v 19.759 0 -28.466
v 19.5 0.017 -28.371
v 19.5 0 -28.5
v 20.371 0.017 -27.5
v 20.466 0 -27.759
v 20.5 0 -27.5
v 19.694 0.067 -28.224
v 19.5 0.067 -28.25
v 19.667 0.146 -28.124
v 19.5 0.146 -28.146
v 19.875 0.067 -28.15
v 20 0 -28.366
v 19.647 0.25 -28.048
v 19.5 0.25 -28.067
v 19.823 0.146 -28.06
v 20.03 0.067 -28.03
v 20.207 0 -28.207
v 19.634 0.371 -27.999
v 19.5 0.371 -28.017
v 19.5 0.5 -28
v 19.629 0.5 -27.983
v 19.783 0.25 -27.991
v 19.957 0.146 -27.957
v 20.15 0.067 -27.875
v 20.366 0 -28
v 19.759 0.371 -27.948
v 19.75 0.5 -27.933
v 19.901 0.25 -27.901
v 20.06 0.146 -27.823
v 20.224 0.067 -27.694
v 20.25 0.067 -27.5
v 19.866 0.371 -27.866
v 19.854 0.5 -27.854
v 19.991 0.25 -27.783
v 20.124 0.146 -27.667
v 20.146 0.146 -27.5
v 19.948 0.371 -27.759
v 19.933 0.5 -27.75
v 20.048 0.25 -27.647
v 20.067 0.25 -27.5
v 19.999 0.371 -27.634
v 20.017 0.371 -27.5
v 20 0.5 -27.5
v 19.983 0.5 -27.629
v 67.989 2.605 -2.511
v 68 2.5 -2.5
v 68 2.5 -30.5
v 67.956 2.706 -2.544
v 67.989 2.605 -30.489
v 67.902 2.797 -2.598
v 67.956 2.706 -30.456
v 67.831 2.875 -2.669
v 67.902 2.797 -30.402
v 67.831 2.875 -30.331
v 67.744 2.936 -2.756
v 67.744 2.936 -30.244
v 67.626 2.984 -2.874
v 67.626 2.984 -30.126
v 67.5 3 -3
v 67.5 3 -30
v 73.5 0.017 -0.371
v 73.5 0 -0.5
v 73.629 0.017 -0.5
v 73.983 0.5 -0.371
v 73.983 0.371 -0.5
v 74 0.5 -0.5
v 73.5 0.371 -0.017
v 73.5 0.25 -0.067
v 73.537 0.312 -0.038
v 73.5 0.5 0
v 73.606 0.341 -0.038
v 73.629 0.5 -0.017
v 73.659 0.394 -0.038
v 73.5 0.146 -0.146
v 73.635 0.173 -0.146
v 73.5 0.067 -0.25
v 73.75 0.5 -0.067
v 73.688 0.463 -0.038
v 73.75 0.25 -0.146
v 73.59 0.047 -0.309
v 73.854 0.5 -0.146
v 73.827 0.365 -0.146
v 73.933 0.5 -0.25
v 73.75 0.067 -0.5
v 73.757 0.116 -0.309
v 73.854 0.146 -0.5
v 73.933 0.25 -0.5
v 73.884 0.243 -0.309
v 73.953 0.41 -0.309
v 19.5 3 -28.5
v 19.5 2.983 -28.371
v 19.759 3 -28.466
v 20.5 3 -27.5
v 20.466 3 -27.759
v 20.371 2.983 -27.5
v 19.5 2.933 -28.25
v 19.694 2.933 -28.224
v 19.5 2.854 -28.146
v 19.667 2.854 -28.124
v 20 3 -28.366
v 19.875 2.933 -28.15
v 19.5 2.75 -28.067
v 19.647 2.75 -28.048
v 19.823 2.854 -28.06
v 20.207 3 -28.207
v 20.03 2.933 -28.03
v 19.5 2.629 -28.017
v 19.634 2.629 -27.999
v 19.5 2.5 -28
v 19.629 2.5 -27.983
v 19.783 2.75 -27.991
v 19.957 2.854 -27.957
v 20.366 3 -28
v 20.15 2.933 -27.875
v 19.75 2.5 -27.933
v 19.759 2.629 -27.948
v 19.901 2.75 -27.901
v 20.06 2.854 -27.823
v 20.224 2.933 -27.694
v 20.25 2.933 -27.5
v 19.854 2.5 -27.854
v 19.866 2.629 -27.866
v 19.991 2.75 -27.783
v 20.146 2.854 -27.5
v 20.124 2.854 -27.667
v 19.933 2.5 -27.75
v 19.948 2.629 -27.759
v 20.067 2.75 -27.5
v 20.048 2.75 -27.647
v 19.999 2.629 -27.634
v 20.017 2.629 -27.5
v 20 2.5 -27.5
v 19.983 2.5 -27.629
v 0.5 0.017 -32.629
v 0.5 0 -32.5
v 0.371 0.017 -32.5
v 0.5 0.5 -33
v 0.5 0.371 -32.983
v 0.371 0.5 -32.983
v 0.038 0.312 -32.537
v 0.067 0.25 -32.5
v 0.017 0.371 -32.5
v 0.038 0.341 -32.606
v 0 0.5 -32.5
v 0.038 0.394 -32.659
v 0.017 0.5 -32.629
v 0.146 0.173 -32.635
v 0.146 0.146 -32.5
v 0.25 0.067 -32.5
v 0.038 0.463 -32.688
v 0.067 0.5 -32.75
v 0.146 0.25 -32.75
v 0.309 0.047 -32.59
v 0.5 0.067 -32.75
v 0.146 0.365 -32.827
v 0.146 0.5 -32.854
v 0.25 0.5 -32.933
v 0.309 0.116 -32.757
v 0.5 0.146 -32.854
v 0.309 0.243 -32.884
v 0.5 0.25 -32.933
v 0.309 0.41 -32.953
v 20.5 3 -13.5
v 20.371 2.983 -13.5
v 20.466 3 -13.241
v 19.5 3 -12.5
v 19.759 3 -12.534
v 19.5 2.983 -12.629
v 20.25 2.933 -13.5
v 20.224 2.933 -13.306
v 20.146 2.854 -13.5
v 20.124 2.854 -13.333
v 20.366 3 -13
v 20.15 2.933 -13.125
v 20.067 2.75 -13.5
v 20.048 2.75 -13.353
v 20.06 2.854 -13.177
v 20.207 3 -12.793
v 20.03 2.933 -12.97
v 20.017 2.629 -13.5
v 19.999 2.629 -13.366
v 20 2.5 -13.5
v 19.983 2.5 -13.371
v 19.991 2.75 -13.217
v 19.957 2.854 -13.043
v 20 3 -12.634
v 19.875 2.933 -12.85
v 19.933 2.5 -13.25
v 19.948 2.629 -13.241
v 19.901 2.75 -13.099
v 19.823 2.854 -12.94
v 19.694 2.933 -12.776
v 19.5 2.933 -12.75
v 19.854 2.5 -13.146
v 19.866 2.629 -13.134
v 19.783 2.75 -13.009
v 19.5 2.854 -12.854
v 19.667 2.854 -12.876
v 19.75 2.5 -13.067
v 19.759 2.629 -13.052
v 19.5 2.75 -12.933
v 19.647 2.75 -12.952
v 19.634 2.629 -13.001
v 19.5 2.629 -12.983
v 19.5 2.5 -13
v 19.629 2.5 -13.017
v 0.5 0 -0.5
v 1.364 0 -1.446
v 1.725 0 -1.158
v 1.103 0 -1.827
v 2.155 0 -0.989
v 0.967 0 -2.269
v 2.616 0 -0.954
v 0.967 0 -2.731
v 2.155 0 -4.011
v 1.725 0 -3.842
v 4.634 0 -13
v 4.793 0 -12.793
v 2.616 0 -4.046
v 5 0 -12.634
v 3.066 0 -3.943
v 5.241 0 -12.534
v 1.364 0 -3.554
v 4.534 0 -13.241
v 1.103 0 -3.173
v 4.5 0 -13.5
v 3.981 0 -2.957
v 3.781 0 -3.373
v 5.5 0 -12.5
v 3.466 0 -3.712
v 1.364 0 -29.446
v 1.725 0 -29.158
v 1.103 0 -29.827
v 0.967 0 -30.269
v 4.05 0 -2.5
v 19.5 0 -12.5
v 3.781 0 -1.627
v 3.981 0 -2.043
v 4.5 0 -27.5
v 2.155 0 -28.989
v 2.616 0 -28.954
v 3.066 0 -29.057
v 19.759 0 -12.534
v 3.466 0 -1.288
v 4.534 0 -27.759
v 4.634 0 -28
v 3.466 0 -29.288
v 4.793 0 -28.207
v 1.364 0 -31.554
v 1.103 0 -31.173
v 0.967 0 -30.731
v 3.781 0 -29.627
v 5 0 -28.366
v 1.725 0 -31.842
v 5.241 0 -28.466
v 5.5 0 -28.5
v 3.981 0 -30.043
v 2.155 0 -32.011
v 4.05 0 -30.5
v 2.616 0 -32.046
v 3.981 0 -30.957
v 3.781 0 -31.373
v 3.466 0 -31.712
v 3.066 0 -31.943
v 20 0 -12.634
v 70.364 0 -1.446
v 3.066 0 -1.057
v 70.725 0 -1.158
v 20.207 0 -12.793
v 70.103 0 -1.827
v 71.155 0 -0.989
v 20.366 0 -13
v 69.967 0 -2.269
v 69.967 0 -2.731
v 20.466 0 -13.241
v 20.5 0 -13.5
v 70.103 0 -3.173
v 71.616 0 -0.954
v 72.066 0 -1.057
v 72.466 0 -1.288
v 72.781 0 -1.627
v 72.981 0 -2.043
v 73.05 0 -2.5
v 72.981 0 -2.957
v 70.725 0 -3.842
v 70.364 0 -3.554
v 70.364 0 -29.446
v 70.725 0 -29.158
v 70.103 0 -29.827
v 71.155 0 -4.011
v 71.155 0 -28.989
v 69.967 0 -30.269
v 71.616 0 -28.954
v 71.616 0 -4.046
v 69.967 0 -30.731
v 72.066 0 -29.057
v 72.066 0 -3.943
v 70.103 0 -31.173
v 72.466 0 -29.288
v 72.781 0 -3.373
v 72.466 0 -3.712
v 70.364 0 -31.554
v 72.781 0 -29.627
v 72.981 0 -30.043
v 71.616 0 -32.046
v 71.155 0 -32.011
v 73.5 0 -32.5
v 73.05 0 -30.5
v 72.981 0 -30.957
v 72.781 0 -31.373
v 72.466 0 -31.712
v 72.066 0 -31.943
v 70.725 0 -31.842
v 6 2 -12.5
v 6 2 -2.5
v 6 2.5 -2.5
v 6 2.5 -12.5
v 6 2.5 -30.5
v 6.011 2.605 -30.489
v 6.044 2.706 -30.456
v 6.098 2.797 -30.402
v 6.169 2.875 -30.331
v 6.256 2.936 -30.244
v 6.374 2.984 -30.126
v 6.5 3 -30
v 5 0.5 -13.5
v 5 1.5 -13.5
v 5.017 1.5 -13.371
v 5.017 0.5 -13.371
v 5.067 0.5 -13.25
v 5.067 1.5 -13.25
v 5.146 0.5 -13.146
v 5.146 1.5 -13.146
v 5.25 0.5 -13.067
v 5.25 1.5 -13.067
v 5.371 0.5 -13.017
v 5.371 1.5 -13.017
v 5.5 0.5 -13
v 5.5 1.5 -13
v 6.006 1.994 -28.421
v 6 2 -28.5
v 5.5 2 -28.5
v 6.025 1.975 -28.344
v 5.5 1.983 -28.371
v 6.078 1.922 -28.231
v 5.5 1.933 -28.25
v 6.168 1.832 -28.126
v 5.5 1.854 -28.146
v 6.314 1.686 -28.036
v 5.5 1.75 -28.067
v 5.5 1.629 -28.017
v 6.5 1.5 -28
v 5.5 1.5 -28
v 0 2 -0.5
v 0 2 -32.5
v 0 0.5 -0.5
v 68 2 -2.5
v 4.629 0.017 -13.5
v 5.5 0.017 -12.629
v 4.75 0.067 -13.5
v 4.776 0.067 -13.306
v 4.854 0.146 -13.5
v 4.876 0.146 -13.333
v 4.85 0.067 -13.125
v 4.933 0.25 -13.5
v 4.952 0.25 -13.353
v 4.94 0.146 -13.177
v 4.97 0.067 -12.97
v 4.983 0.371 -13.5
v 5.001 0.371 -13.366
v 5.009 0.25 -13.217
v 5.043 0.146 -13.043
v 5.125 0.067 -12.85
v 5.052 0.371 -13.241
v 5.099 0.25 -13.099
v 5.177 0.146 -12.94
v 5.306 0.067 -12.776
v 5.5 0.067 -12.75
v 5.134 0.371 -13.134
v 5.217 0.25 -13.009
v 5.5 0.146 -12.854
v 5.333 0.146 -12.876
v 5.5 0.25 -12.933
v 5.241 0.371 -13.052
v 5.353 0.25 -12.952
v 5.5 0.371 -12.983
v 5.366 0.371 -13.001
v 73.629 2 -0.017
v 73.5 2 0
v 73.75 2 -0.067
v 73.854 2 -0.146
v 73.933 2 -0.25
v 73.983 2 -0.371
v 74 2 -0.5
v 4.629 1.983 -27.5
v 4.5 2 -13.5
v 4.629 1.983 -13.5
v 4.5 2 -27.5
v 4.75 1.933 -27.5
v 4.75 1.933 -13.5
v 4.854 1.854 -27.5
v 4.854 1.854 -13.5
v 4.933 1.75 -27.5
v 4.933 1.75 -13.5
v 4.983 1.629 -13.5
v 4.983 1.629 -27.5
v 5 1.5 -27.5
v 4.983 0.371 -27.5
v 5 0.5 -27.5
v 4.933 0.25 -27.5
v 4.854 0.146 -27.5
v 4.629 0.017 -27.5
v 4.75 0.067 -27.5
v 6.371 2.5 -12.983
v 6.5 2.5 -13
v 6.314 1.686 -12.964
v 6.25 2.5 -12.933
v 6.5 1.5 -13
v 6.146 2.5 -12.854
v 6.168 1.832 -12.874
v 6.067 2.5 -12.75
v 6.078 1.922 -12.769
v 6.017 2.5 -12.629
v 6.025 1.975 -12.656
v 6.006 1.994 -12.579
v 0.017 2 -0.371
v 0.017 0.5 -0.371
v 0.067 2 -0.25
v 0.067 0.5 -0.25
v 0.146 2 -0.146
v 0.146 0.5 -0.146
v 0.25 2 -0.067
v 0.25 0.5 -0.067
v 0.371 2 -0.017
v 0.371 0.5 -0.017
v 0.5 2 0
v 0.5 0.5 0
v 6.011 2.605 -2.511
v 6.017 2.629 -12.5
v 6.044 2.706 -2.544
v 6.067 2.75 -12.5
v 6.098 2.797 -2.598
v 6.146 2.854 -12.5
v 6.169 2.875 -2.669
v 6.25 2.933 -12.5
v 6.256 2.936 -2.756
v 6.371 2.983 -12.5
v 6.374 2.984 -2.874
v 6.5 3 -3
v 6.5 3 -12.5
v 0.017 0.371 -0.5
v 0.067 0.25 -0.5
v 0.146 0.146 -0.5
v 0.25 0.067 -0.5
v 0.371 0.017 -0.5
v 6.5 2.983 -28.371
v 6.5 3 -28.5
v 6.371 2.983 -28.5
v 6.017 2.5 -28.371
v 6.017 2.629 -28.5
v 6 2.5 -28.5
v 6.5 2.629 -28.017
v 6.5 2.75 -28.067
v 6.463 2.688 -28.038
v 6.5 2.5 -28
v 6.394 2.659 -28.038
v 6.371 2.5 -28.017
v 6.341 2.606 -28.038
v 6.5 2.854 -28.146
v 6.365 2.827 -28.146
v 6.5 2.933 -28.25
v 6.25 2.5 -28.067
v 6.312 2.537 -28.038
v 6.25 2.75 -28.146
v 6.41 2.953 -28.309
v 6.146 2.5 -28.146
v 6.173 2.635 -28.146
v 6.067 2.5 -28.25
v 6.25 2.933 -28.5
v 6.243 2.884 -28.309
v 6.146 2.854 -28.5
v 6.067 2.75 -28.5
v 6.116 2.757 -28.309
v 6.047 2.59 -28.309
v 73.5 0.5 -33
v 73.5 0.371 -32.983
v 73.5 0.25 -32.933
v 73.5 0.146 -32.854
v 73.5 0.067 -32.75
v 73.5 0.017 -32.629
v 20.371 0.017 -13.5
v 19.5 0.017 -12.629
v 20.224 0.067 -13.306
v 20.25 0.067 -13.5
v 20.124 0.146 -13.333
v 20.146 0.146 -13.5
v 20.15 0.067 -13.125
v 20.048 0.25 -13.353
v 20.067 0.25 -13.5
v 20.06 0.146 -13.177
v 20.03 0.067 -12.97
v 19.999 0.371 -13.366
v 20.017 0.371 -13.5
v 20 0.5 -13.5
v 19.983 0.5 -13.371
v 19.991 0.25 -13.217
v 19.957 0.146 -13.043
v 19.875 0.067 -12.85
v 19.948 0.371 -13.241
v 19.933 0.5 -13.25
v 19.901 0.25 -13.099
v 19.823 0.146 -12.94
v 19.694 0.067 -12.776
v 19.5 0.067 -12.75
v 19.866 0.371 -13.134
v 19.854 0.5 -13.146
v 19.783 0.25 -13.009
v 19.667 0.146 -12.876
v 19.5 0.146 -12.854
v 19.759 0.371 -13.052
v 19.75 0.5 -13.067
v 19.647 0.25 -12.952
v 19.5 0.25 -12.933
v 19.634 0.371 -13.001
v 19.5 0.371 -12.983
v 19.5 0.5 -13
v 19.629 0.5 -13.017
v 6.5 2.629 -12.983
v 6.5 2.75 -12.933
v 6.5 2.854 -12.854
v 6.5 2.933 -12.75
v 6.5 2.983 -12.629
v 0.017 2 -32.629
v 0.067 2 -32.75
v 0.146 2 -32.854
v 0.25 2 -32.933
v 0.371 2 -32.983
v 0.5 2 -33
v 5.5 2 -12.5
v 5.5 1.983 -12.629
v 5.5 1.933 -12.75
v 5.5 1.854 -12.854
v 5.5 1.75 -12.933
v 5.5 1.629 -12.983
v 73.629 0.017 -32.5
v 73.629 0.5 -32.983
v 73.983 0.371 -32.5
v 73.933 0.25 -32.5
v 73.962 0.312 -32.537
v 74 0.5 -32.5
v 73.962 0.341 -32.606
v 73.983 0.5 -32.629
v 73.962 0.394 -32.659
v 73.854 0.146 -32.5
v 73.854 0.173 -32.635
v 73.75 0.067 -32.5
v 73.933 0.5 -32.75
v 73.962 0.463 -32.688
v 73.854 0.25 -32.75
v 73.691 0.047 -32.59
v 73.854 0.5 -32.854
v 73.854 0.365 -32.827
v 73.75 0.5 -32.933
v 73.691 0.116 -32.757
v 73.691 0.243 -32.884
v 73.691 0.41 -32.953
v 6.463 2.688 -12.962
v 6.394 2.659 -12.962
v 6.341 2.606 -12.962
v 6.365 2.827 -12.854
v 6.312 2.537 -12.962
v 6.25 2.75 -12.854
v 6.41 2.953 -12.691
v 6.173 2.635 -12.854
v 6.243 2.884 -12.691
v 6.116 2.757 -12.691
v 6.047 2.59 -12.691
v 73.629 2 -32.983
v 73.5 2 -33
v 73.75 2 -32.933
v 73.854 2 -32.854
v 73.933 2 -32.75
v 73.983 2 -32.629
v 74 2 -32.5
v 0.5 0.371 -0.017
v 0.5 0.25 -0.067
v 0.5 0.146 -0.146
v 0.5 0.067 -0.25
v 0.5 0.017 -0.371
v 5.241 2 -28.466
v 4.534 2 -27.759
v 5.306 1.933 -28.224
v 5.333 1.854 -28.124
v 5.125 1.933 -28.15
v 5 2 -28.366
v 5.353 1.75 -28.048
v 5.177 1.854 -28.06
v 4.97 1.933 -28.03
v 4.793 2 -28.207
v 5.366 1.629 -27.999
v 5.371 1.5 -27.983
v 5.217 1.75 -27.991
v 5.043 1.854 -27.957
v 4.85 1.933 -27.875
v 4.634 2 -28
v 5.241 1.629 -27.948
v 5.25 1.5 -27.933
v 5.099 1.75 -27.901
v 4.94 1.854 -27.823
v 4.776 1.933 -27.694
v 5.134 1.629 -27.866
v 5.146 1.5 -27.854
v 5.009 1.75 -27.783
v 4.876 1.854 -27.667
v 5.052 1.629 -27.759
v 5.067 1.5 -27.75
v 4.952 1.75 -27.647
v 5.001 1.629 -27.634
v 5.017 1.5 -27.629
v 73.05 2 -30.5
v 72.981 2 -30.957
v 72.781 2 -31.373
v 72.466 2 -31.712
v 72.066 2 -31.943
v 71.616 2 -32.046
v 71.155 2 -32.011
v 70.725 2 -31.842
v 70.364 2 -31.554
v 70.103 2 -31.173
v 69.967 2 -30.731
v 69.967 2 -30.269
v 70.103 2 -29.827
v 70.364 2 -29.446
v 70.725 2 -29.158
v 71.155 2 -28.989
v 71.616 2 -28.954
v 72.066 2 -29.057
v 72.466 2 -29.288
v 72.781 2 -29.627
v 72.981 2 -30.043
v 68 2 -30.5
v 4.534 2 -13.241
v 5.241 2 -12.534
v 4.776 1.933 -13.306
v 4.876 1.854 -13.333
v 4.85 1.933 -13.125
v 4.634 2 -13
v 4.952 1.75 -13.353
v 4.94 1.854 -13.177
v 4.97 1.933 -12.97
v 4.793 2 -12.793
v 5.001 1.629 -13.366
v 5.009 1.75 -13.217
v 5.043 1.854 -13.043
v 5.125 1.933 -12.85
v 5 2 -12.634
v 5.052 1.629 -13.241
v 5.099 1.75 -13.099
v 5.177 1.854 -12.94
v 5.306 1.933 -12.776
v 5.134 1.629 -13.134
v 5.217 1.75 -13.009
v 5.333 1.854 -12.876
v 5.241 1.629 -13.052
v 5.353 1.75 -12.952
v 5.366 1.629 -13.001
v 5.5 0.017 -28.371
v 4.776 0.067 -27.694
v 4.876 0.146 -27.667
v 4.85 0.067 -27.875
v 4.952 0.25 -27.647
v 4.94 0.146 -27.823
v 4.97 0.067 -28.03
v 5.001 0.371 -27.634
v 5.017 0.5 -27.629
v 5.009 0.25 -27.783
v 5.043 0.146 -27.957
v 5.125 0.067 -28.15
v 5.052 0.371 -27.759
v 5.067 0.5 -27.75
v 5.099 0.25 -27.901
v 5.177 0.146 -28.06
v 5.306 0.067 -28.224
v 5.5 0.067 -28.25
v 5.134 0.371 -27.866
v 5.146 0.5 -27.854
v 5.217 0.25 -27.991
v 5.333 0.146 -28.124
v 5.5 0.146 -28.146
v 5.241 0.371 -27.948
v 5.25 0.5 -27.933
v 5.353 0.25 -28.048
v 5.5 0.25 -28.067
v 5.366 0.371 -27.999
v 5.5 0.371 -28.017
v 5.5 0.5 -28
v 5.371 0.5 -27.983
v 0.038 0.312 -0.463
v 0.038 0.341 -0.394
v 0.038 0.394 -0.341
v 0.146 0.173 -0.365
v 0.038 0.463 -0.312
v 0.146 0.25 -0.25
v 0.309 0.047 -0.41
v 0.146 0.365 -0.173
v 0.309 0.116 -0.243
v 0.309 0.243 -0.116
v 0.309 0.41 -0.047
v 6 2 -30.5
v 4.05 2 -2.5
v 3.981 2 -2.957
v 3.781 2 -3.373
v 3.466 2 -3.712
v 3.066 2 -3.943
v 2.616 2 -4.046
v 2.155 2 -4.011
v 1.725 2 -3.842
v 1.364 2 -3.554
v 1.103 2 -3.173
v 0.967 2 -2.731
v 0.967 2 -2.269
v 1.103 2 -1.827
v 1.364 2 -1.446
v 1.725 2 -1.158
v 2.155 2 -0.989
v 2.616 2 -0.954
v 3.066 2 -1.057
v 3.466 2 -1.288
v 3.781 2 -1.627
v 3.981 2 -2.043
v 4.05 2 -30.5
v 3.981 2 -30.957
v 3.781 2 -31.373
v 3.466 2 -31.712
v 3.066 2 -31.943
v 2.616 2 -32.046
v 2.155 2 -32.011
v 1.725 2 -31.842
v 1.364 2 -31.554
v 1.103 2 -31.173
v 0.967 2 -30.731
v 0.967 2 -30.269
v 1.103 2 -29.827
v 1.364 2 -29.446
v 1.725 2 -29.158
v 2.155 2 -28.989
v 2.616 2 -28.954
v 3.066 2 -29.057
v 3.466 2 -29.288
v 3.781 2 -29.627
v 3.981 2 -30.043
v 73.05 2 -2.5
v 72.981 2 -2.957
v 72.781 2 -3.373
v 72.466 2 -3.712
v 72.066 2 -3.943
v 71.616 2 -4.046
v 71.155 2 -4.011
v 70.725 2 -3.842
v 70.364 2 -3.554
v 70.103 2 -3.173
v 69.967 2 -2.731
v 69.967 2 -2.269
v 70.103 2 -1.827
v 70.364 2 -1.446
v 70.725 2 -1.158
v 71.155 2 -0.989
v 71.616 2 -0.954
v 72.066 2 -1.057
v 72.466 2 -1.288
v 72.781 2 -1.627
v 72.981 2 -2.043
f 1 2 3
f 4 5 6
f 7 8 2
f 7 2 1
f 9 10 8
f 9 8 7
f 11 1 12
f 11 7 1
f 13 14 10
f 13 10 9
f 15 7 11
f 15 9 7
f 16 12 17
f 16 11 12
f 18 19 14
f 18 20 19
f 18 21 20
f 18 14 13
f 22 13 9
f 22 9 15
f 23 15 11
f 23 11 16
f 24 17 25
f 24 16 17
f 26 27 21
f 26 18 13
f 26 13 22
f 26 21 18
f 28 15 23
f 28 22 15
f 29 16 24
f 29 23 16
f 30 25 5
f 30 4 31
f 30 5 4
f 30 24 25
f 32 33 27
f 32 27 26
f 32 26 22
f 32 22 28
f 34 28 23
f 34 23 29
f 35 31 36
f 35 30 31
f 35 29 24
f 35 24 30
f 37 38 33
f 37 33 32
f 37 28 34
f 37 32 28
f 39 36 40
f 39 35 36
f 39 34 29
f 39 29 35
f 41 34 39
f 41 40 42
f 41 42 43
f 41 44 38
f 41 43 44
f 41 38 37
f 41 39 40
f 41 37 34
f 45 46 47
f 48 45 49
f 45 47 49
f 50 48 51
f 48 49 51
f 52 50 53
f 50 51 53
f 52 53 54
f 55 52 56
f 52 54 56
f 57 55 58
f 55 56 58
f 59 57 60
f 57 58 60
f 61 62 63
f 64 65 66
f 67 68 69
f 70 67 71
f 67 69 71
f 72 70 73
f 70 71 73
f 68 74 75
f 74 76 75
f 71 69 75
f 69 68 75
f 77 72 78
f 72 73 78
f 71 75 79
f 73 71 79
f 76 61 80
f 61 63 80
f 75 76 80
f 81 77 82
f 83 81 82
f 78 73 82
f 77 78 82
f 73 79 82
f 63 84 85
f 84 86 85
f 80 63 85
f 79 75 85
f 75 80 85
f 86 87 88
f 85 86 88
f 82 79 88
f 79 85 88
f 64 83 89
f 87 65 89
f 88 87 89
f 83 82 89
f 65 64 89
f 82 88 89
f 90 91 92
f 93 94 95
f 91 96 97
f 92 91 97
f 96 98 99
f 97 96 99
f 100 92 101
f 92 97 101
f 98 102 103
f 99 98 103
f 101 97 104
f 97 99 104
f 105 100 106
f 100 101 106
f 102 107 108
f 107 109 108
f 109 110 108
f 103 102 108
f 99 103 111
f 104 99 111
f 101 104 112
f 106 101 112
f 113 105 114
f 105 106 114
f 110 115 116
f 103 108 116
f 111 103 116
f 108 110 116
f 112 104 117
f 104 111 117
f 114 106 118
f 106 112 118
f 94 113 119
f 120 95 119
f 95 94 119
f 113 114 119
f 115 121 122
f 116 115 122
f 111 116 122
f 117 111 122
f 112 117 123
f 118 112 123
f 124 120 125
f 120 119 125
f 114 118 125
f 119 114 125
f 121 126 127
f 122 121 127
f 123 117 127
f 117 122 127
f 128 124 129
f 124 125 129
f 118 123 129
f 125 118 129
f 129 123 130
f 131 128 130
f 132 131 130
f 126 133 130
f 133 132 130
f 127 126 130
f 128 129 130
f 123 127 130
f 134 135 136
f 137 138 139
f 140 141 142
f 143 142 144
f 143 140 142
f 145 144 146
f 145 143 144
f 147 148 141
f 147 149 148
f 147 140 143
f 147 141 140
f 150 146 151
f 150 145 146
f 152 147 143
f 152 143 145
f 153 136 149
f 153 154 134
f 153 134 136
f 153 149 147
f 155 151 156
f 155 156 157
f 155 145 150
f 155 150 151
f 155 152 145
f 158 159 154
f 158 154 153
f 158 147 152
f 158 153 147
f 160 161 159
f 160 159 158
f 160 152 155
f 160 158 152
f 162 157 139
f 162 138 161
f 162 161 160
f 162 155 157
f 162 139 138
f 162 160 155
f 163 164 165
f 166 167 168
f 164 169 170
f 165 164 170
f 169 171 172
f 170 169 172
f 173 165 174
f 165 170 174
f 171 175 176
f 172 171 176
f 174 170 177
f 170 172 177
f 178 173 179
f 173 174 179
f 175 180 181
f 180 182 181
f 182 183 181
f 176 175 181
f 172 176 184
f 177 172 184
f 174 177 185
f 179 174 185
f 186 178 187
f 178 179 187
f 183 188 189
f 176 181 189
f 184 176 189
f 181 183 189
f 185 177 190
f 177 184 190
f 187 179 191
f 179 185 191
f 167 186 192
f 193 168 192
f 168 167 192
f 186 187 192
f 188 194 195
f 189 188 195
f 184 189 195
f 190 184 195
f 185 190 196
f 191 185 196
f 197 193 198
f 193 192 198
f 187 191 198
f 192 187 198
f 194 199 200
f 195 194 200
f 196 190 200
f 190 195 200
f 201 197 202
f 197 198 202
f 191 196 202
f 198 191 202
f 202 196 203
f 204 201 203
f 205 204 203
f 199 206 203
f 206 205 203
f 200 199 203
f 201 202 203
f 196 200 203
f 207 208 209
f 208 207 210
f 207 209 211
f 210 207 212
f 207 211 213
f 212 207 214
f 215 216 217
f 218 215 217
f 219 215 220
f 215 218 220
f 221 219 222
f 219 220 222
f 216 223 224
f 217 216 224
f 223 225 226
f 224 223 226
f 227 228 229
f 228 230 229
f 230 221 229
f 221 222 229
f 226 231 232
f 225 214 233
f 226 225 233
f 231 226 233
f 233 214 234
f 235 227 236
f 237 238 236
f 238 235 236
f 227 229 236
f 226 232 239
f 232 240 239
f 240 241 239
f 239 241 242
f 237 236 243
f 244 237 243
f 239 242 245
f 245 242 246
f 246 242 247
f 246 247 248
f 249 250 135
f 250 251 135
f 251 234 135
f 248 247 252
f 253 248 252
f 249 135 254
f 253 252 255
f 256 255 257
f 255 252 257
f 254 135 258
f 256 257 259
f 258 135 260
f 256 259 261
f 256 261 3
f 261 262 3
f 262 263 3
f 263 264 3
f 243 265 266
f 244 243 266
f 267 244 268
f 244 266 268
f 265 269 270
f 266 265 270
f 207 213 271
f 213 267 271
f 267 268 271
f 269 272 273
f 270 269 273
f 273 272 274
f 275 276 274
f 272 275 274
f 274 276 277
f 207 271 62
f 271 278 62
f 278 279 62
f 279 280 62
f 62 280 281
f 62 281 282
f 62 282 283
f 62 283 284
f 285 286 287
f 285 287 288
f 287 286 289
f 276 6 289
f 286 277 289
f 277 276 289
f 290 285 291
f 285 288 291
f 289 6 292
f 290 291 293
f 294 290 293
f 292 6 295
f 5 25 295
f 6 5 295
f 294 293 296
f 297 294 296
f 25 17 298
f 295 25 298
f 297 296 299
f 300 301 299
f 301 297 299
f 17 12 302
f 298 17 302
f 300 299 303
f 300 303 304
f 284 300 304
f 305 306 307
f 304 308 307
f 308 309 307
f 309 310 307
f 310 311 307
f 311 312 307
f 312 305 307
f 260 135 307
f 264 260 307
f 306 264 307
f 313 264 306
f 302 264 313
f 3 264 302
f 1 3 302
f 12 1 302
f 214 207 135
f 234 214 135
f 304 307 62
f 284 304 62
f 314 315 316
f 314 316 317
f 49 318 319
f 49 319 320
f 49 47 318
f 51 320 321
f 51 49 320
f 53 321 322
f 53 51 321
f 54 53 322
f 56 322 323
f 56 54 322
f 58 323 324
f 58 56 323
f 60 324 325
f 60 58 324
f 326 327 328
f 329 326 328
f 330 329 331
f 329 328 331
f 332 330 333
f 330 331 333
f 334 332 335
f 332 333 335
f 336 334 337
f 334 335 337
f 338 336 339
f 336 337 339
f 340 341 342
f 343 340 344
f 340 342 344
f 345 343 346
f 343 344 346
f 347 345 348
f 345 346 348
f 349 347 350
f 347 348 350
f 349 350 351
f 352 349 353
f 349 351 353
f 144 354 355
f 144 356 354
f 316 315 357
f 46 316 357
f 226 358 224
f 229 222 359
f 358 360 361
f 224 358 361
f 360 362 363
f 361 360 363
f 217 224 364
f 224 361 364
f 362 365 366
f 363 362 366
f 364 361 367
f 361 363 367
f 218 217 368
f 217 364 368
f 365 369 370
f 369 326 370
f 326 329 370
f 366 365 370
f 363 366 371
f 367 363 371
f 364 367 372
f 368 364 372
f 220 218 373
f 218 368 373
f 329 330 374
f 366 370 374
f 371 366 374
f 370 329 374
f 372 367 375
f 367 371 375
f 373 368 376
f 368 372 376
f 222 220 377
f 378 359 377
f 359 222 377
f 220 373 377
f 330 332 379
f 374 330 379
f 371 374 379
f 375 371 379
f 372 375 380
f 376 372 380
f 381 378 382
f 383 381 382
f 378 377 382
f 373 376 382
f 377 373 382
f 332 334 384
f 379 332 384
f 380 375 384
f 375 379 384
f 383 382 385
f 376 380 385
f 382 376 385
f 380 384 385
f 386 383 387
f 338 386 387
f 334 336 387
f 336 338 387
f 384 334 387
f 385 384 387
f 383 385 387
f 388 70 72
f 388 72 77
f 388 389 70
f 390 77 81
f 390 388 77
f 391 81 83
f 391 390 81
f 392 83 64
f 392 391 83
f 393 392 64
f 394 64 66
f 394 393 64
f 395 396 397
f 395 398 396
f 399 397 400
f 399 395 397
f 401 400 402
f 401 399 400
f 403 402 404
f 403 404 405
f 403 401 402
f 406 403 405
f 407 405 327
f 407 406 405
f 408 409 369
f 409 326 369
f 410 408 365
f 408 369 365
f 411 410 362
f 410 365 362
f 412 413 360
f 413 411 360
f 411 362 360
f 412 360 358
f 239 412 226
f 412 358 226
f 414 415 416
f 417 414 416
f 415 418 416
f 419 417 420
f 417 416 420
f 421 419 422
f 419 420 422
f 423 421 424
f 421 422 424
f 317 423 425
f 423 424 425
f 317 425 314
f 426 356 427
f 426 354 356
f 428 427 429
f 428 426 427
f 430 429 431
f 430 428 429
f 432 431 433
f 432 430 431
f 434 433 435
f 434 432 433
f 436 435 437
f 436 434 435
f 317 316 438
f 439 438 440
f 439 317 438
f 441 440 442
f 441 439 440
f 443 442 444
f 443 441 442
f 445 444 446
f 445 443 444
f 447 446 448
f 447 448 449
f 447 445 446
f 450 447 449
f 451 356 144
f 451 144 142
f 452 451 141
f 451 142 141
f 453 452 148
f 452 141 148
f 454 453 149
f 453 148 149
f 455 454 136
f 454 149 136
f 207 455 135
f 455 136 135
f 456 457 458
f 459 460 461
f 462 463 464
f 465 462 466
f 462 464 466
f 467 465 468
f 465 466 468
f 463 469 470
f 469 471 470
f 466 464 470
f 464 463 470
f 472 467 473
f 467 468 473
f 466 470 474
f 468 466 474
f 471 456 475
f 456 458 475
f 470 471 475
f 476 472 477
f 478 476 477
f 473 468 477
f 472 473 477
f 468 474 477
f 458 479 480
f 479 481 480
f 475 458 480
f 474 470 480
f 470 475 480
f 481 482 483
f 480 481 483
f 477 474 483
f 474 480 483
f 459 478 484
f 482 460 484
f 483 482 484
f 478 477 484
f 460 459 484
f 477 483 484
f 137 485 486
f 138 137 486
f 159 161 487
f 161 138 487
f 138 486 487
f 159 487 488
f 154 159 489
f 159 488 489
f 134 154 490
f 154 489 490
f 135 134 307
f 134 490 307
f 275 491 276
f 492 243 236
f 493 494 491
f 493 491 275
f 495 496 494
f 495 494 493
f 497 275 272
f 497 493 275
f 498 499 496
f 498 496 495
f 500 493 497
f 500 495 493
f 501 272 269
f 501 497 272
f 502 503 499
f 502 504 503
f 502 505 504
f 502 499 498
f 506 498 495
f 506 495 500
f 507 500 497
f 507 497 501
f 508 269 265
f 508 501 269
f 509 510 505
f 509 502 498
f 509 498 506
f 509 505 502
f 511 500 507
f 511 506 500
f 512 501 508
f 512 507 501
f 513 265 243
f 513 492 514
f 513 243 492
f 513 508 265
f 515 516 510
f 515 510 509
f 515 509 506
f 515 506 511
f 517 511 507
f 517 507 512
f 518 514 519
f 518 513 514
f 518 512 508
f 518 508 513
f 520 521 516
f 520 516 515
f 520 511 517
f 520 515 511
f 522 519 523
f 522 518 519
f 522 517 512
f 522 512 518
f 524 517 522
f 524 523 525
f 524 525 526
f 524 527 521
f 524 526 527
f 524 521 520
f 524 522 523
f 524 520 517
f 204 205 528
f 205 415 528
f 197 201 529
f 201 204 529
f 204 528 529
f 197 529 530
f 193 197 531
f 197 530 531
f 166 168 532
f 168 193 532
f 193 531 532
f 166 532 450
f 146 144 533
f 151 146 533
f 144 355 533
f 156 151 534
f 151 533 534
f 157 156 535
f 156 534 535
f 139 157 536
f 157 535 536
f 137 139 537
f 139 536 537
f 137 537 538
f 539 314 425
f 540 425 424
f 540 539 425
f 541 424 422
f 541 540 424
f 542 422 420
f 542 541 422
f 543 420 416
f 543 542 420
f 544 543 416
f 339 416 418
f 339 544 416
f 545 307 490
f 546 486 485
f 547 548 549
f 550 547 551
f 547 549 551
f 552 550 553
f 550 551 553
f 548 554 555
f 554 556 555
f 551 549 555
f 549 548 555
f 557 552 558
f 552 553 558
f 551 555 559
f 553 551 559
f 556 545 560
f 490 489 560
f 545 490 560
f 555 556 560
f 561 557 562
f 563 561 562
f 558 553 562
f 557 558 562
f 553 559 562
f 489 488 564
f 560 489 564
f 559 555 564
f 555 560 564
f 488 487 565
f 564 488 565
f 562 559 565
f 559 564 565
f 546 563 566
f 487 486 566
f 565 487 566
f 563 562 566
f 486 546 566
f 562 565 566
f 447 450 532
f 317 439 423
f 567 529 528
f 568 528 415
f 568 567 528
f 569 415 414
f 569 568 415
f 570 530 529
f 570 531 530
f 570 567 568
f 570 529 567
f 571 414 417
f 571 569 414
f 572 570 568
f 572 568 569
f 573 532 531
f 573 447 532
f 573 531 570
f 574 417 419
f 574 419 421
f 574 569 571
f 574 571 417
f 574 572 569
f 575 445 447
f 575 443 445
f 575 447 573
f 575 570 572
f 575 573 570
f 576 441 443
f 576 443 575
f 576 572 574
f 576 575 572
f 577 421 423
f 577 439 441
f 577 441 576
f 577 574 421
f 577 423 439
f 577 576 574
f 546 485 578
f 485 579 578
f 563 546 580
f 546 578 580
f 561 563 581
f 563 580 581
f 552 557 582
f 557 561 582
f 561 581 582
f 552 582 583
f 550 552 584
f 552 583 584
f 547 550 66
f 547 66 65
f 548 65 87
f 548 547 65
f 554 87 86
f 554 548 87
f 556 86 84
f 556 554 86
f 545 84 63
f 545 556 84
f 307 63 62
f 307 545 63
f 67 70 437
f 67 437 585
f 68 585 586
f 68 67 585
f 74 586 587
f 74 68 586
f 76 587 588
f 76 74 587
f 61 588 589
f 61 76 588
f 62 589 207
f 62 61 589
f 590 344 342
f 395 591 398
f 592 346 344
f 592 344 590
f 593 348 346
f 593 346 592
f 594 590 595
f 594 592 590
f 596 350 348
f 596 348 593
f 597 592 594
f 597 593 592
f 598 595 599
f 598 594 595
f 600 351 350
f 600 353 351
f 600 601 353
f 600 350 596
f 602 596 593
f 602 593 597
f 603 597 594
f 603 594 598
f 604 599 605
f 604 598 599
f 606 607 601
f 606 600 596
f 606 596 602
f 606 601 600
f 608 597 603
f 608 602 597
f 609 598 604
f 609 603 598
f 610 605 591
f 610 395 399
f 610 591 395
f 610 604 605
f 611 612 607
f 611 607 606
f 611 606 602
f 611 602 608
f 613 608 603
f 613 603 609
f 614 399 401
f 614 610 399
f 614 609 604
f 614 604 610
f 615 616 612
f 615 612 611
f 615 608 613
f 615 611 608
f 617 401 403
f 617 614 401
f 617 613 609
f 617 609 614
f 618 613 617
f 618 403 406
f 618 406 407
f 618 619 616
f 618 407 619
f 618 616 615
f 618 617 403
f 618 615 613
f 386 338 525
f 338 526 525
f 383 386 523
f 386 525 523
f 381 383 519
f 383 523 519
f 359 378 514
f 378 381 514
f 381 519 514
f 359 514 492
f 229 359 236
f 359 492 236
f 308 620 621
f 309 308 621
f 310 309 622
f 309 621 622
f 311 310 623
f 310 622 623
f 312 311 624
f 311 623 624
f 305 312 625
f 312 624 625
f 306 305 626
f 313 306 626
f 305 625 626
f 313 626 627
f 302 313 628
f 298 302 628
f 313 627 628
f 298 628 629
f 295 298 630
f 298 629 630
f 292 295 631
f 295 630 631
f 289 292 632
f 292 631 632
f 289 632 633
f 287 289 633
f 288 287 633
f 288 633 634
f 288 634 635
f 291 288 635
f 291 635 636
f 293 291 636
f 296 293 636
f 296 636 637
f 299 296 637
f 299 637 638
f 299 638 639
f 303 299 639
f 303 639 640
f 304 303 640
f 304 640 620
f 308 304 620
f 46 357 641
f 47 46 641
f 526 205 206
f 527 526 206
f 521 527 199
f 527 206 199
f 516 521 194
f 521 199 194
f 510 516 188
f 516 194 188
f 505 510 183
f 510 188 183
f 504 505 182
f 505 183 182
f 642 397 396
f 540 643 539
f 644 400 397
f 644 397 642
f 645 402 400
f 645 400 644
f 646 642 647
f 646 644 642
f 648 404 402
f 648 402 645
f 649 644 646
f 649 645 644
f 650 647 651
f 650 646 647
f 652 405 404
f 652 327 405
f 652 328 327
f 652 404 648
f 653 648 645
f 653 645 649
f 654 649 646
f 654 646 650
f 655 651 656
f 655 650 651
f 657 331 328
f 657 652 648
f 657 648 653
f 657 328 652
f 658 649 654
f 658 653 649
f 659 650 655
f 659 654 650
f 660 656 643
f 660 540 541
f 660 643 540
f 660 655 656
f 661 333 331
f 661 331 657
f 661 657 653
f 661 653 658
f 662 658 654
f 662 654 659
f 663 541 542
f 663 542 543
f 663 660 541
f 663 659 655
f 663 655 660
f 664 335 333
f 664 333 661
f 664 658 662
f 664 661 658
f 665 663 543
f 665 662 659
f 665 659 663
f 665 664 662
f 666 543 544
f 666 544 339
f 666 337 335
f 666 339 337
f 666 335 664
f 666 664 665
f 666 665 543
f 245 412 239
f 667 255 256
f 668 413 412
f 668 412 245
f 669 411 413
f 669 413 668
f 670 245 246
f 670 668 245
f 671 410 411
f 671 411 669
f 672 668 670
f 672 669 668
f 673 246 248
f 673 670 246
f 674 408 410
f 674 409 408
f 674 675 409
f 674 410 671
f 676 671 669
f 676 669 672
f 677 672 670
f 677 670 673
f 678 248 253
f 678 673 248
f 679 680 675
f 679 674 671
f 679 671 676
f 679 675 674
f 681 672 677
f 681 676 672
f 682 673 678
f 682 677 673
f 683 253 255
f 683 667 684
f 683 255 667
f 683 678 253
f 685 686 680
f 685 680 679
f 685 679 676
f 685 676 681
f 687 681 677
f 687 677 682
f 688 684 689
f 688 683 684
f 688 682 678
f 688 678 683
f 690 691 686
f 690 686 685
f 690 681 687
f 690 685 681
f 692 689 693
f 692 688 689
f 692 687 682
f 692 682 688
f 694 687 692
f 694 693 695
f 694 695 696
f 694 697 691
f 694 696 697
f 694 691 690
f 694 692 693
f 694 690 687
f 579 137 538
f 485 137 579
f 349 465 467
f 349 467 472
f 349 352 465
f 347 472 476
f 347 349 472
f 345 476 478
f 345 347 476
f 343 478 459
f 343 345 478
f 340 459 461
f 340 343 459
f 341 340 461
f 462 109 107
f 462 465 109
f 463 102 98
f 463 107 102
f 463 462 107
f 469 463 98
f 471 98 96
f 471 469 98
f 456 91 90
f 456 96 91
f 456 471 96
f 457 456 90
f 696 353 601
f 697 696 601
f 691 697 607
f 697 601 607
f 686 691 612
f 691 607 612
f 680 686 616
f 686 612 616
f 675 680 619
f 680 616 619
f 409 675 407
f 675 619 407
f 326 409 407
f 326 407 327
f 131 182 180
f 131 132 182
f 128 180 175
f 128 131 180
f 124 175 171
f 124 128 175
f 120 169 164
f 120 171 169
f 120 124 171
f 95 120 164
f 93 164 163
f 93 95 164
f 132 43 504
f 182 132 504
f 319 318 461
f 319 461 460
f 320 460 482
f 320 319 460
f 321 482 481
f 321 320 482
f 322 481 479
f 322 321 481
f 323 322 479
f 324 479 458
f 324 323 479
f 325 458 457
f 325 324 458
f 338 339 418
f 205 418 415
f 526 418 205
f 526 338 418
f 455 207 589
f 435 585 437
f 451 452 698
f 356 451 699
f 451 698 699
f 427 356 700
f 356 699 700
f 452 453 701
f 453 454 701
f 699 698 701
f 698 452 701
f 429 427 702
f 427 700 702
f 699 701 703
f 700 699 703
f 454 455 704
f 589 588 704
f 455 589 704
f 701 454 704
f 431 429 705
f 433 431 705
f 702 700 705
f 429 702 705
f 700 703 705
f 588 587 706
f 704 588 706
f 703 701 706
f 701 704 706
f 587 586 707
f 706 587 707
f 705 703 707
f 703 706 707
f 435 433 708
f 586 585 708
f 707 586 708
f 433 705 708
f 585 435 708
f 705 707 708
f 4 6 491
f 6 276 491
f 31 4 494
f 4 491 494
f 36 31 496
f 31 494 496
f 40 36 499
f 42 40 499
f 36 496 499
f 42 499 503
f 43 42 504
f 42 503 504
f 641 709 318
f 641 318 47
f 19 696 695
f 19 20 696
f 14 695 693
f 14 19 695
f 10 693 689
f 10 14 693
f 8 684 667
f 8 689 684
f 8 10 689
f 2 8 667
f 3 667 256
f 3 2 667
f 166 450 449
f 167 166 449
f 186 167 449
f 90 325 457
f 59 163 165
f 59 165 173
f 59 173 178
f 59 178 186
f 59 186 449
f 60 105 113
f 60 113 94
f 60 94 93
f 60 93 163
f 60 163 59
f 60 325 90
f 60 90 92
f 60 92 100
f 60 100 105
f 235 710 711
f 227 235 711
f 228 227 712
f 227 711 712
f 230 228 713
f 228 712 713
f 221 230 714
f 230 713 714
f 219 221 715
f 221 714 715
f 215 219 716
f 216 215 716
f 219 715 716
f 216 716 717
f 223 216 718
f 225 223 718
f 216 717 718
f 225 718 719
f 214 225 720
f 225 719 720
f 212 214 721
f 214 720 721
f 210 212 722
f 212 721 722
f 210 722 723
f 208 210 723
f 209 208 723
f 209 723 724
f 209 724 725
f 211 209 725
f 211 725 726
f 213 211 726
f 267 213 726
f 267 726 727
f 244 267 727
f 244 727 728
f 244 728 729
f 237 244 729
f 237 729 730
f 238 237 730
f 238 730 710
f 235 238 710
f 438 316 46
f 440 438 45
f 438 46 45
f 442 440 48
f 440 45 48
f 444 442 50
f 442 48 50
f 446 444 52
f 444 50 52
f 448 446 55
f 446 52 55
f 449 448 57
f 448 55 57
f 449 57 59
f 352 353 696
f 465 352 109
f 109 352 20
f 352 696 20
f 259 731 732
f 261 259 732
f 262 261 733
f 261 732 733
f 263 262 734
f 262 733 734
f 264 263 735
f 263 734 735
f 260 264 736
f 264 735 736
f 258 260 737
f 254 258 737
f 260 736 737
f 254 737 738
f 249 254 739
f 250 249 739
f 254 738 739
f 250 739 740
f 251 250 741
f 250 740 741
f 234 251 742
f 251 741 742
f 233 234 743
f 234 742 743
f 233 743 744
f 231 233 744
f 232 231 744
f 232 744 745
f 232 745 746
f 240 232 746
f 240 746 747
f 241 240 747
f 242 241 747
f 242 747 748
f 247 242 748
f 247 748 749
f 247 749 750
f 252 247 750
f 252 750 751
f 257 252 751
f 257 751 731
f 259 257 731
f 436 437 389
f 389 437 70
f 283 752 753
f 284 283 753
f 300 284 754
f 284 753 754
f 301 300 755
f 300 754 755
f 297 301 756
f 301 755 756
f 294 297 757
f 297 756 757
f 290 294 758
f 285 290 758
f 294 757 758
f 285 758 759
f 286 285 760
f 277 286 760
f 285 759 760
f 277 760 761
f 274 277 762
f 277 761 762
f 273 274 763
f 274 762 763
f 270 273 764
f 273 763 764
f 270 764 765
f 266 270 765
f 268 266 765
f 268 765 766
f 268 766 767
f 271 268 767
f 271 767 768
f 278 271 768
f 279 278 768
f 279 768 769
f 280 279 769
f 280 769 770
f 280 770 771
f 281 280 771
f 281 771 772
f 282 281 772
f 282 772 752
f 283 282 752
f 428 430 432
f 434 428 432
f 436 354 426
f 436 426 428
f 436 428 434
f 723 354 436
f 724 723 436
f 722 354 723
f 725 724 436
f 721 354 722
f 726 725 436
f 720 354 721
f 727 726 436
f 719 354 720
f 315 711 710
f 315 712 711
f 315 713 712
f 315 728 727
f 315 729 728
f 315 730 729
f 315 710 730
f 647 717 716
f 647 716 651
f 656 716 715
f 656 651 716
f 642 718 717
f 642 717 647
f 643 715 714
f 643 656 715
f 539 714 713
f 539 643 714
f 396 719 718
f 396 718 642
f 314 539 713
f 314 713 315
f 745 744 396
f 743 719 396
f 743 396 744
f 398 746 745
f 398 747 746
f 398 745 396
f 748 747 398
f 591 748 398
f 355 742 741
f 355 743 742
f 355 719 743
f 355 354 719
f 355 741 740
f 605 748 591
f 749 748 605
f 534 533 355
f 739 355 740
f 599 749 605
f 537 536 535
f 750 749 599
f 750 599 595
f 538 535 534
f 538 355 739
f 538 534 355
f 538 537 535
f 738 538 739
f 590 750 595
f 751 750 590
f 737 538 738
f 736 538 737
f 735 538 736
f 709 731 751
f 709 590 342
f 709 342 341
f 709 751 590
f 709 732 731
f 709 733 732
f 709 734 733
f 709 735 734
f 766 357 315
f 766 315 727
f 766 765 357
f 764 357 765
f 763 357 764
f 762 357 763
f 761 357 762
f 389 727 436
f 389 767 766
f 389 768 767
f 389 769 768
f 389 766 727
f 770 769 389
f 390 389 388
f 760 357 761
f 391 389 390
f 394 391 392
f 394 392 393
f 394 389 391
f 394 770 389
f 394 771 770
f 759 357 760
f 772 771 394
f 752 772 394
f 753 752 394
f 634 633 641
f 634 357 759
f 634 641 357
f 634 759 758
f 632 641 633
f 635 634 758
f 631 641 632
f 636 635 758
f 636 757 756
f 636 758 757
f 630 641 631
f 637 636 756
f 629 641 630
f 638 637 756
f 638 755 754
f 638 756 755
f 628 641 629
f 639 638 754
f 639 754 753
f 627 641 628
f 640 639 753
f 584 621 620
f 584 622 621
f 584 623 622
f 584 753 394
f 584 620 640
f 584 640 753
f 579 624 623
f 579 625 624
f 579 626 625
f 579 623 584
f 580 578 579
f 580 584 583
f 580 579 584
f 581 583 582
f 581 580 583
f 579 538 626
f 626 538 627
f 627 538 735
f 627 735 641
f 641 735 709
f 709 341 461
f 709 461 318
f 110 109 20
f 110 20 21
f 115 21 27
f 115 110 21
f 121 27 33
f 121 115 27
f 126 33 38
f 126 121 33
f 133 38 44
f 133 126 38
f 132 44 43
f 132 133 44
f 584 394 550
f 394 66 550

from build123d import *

# Parameters (mm, degrees)
SKETCH1_W           = 74
SKETCH1_H           = 33
BOSS_EXTRUDE1_DEPTH = 2
SKETCH2_W           = 62
SKETCH2_H           = 28
BOSS_EXTRUDE2_DEPTH = 1
SKETCH3_R           = 1.55
CUT_EXTRUDE2_DEPTH  = 5
FILLET1_R           = 0.5
FILLET2_R           = 0.5
SKETCH4_W           = 15
SKETCH4_H           = 15
CUT_EXTRUDE3_DEPTH  = 10
FILLET3_R           = 0.5


with BuildPart() as part:
    # Sketch1 → Boss-Extrude1 (new body)
    with BuildSketch(Plane(origin=(0, 0, 0), x_dir=(1, 0, 0), z_dir=(0, 1, 0))):
        with Locations((37, 16.5)):
            Rectangle(SKETCH1_W, SKETCH1_H)
    extrude(amount=BOSS_EXTRUDE1_DEPTH)

    # Sketch2 → Boss-Extrude2 (add)
    with BuildSketch(Plane(origin=(0, 2, 0), x_dir=(1, 0, 0), z_dir=(0, 1, 0))):
        with Locations((37, 16.5)):
            Rectangle(SKETCH2_W, SKETCH2_H)
    extrude(amount=BOSS_EXTRUDE2_DEPTH)

    # Sketch3 → Cut-Extrude2 (cut)
    with BuildSketch(Plane(origin=(0, 2, 0), x_dir=(1, 0, 0), z_dir=(0, 1, 0))):
        with Locations((2.5, 30.5)):
            Circle(SKETCH3_R)
        with Locations((71.5, 2.5)):
            Circle(SKETCH3_R)
        with Locations((2.5, 2.5)):
            Circle(SKETCH3_R)
        with Locations((71.5, 30.5)):
            Circle(SKETCH3_R)
    extrude(amount=-CUT_EXTRUDE2_DEPTH, mode=Mode.SUBTRACT)

    # Fillet1
    fillet1_edges = [part.edges().sort_by_distance(p)[0] for p in [
        (6, 3, -16.5),
        (37, 3, -2.5),
        (68, 3, -16.5),
        (37, 3, -30.5),
    ]]
    fillet(fillet1_edges, radius=FILLET1_R)

    # Fillet2
    fillet2_edges = [part.edges().sort_by_distance(p)[0] for p in [
        (37, 0, -33),
        (74, 0, -16.5),
        (37, 0, 0),
        (0, 0, -16.5),
        (0, 1, -33),
        (74, 1, -33),
        (74, 1, 0),
        (0, 1, 0),
    ]]
    fillet(fillet2_edges, radius=FILLET2_R)

    # Sketch4 → Cut-Extrude3 (cut)
    with BuildSketch(Plane.XZ):
        with Locations((12.5, -20.5)):
            Rectangle(SKETCH4_W, SKETCH4_H)
    extrude(amount=-CUT_EXTRUDE3_DEPTH, mode=Mode.SUBTRACT)

    # Fillet3
    fillet3_edges = [part.edges().sort_by_distance(p)[0] for p in [
        (13.25, 3, -13),
        (20, 1.5, -13),
        (13.25, 3, -28),
        (5, 0, -20.5),
        (12.5, 0, -28),
        (20, 0, -20.5),
        (12.5, 0, -13),
        (6.146446609, 2.853553391, -28),
        (6.146446609, 2.853553391, -13),
        (20, 3, -20.5),
        (5, 2, -20.5),
        (5, 1, -28),
        (6, 2.25, -13),
        (5.5, 2, -13),
        (5, 1, -13),
        (5.5, 2, -28),
        (6, 2.25, -28),
        (20, 1.5, -28),
    ]]
    fillet(fillet3_edges, radius=FILLET3_R)


solid = part.part
